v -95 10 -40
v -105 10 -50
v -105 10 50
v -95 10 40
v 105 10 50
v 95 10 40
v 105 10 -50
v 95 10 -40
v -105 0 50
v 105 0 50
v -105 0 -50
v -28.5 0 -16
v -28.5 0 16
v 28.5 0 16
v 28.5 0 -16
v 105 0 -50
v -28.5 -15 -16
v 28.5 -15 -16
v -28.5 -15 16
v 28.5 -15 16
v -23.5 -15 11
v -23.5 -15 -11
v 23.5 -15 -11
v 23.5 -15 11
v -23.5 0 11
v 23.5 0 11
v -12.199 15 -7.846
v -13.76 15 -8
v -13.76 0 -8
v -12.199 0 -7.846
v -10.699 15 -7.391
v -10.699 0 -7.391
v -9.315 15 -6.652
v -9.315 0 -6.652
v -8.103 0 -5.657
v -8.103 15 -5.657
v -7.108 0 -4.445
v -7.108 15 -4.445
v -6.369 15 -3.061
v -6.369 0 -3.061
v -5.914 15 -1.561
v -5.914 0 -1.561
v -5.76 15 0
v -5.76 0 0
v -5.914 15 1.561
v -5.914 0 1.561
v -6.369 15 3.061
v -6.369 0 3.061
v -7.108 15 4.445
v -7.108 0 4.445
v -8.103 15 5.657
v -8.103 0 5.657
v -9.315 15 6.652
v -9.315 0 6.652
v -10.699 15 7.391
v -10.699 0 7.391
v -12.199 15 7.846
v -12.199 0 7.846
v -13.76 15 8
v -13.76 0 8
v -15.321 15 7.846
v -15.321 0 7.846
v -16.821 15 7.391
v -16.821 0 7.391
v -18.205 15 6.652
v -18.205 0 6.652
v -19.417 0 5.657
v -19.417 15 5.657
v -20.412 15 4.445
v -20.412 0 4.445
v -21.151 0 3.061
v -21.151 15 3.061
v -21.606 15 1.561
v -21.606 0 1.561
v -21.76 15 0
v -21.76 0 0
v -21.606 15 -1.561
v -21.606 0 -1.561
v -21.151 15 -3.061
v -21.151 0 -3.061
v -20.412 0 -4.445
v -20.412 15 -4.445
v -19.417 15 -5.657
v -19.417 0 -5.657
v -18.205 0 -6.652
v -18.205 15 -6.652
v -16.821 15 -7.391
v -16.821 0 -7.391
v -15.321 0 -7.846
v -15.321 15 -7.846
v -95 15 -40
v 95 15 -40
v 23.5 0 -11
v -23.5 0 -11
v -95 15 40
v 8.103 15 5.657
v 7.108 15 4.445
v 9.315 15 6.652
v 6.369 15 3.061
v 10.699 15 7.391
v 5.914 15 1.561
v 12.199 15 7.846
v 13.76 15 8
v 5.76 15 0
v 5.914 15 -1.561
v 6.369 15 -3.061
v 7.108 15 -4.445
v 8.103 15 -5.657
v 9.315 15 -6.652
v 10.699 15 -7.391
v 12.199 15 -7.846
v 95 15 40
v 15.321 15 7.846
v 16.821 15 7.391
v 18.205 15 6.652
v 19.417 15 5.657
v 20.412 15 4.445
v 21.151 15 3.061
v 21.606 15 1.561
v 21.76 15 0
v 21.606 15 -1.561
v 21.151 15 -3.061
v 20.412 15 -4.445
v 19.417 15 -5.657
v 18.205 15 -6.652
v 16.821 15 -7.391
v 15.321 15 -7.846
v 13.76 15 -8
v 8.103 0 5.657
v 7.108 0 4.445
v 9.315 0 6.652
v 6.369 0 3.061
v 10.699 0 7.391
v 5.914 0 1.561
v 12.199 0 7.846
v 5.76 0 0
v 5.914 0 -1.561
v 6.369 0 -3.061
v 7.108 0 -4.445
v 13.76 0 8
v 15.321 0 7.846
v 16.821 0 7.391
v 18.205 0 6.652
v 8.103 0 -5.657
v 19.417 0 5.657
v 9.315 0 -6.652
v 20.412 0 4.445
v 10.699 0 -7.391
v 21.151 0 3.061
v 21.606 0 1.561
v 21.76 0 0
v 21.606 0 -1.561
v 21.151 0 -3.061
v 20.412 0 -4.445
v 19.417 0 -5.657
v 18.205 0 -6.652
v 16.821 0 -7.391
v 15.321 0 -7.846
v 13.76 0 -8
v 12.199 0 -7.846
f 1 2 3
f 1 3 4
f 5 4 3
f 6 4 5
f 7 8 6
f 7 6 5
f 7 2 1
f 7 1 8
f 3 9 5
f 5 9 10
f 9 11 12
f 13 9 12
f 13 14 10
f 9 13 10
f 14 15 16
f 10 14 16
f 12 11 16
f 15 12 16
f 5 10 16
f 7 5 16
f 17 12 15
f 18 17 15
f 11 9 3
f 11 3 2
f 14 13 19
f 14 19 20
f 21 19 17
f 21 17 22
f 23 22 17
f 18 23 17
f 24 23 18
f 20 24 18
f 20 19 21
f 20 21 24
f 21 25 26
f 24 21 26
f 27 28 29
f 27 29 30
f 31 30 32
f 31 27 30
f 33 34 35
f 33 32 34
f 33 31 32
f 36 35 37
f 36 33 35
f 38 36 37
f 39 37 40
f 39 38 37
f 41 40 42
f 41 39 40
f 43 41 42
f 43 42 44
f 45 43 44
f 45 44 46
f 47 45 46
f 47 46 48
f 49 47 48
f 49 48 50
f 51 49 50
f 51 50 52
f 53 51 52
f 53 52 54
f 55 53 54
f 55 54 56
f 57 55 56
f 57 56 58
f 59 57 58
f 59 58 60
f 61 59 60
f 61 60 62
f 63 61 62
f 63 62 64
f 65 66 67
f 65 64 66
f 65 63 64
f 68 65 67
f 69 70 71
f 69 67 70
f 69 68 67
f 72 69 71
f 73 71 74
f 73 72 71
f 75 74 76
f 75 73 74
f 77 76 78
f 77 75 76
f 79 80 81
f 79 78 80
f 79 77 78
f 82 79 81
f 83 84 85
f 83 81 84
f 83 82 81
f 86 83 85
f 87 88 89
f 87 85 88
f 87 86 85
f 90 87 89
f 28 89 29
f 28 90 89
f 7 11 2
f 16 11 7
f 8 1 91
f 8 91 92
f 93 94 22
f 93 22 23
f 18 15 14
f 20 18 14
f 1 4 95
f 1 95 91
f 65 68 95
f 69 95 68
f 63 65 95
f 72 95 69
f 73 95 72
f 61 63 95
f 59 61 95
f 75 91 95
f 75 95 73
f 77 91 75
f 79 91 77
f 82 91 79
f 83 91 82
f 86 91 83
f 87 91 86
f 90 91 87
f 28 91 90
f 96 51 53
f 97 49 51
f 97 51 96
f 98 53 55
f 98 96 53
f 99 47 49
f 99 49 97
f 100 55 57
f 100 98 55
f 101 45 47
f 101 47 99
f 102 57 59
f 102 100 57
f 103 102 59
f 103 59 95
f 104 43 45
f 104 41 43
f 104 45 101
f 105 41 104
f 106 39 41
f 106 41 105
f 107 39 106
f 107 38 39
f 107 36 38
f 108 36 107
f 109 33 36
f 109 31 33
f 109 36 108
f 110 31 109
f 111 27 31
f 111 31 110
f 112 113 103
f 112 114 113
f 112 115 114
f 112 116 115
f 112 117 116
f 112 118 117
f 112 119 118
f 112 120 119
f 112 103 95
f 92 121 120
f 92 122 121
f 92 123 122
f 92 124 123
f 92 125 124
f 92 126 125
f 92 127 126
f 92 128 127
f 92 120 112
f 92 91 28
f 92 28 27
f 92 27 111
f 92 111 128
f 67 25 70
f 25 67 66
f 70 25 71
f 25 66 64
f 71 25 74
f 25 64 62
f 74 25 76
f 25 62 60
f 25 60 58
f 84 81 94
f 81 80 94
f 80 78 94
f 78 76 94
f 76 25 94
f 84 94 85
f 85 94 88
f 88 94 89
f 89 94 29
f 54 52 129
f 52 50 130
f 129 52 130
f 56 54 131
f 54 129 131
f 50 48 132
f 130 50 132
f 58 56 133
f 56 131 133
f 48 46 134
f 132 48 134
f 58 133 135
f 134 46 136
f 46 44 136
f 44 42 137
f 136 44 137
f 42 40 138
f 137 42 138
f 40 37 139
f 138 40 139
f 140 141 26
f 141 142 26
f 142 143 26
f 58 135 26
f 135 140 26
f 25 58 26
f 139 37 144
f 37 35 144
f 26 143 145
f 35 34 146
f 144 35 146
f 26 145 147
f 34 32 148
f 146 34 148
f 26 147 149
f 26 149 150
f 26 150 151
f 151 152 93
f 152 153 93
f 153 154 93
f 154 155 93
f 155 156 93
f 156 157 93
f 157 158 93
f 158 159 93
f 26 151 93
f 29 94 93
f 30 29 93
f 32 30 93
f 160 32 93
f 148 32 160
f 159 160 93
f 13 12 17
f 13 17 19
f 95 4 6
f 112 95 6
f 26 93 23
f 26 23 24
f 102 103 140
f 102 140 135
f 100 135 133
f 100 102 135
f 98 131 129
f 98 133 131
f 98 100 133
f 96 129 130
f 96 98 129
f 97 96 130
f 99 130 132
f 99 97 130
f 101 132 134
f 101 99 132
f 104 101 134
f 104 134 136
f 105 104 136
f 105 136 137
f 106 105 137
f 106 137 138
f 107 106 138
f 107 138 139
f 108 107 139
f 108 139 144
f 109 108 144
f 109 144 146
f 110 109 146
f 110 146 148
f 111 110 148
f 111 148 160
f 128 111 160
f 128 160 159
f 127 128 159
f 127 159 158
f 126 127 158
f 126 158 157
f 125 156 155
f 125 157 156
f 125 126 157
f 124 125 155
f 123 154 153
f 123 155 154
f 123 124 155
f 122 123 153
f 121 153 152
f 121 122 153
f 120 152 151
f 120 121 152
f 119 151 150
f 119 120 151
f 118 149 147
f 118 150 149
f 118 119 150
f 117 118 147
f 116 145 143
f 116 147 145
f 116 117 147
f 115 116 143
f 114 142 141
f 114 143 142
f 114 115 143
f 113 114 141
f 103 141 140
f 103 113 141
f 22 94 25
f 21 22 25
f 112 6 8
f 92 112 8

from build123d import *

# Parameters (mm, degrees)
SKETCH1_W               = 210
SKETCH1_H               = 100
BOSS_EXTRUDE1_DEPTH     = 10
SKETCH2_W               = 190
SKETCH2_H               = 80
BOSS_EXTRUDE2_DEPTH     = 5
SKETCH3_W               = 57
SKETCH3_H               = 32
SKETCH3_W_2             = 47
SKETCH3_H_2             = 22
BOSS_EXTRUDE3_DEPTH     = 15
CUT_EXTRUDE1_DEPTH      = 118.260393996
CUT_EXTRUDE1_DEPTH_BACK = 118.260393996
SKETCH4_R               = 8


with BuildPart() as part:
    # Sketch1 → Boss-Extrude1 (new body)
    with BuildSketch(Plane(origin=(0, 0, 0), x_dir=(1, 0, 0), z_dir=(0, 1, 0))):
        Rectangle(SKETCH1_W, SKETCH1_H)
    extrude(amount=BOSS_EXTRUDE1_DEPTH)

    # Sketch2 → Boss-Extrude2 (add)
    with BuildSketch(Plane(origin=(0, 10, 0), x_dir=(1, 0, 0), z_dir=(0, 1, 0))):
        Rectangle(SKETCH2_W, SKETCH2_H)
    extrude(amount=BOSS_EXTRUDE2_DEPTH)

    # Sketch3 → Boss-Extrude3 (add)
    with BuildSketch(Plane.XZ):
        Rectangle(SKETCH3_W, SKETCH3_H)
        Rectangle(SKETCH3_W_2, SKETCH3_H_2, mode=Mode.SUBTRACT)
    extrude(amount=BOSS_EXTRUDE3_DEPTH)

    # Sketch4 → Cut-Extrude1 (cut, two sides: drawn at the far end of the back side and taken through both)
    with BuildSketch(Plane.XZ.offset(-CUT_EXTRUDE1_DEPTH_BACK)):
        with Locations(Location((-13.76, 0, 0), (0, 0, 270))):
            Circle(SKETCH4_R)
        with Locations(Location((13.76, 0, 0), (0, 0, 90))):
            Circle(SKETCH4_R)
    extrude(amount=CUT_EXTRUDE1_DEPTH + CUT_EXTRUDE1_DEPTH_BACK, mode=Mode.SUBTRACT)


solid = part.part
